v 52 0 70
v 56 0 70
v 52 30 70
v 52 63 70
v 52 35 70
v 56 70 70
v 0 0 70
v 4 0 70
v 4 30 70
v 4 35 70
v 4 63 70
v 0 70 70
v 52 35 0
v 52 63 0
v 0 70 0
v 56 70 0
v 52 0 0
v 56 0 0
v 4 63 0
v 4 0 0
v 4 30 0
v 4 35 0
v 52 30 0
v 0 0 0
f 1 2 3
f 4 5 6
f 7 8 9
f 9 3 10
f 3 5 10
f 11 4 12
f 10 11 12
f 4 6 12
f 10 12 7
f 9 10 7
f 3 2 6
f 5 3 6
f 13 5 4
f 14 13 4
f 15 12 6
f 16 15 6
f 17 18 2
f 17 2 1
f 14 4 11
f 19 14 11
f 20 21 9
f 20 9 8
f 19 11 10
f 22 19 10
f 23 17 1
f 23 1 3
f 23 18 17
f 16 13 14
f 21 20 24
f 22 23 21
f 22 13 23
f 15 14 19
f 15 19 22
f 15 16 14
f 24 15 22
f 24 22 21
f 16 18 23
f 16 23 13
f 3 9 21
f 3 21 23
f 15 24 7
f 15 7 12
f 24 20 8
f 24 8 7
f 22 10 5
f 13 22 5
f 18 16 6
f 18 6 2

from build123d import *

# Parameters (mm, degrees)
SKETCH1_W           = 48
SKETCH1_H           = 5
BOSS_EXTRUDE1_DEPTH = 70


with BuildPart() as part:
    # Sketch1 → Boss-Extrude1 (new body)
    with BuildSketch(Plane.XY):
        Polygon((4, 0), (0, 0), (0, 70), (56, 70), (56, 0), (52, 0), (52, 63), (4, 63), align=None)
        with Locations((28, 32.5)):
            Rectangle(SKETCH1_W, SKETCH1_H)
    extrude(amount=BOSS_EXTRUDE1_DEPTH)


solid = part.part
